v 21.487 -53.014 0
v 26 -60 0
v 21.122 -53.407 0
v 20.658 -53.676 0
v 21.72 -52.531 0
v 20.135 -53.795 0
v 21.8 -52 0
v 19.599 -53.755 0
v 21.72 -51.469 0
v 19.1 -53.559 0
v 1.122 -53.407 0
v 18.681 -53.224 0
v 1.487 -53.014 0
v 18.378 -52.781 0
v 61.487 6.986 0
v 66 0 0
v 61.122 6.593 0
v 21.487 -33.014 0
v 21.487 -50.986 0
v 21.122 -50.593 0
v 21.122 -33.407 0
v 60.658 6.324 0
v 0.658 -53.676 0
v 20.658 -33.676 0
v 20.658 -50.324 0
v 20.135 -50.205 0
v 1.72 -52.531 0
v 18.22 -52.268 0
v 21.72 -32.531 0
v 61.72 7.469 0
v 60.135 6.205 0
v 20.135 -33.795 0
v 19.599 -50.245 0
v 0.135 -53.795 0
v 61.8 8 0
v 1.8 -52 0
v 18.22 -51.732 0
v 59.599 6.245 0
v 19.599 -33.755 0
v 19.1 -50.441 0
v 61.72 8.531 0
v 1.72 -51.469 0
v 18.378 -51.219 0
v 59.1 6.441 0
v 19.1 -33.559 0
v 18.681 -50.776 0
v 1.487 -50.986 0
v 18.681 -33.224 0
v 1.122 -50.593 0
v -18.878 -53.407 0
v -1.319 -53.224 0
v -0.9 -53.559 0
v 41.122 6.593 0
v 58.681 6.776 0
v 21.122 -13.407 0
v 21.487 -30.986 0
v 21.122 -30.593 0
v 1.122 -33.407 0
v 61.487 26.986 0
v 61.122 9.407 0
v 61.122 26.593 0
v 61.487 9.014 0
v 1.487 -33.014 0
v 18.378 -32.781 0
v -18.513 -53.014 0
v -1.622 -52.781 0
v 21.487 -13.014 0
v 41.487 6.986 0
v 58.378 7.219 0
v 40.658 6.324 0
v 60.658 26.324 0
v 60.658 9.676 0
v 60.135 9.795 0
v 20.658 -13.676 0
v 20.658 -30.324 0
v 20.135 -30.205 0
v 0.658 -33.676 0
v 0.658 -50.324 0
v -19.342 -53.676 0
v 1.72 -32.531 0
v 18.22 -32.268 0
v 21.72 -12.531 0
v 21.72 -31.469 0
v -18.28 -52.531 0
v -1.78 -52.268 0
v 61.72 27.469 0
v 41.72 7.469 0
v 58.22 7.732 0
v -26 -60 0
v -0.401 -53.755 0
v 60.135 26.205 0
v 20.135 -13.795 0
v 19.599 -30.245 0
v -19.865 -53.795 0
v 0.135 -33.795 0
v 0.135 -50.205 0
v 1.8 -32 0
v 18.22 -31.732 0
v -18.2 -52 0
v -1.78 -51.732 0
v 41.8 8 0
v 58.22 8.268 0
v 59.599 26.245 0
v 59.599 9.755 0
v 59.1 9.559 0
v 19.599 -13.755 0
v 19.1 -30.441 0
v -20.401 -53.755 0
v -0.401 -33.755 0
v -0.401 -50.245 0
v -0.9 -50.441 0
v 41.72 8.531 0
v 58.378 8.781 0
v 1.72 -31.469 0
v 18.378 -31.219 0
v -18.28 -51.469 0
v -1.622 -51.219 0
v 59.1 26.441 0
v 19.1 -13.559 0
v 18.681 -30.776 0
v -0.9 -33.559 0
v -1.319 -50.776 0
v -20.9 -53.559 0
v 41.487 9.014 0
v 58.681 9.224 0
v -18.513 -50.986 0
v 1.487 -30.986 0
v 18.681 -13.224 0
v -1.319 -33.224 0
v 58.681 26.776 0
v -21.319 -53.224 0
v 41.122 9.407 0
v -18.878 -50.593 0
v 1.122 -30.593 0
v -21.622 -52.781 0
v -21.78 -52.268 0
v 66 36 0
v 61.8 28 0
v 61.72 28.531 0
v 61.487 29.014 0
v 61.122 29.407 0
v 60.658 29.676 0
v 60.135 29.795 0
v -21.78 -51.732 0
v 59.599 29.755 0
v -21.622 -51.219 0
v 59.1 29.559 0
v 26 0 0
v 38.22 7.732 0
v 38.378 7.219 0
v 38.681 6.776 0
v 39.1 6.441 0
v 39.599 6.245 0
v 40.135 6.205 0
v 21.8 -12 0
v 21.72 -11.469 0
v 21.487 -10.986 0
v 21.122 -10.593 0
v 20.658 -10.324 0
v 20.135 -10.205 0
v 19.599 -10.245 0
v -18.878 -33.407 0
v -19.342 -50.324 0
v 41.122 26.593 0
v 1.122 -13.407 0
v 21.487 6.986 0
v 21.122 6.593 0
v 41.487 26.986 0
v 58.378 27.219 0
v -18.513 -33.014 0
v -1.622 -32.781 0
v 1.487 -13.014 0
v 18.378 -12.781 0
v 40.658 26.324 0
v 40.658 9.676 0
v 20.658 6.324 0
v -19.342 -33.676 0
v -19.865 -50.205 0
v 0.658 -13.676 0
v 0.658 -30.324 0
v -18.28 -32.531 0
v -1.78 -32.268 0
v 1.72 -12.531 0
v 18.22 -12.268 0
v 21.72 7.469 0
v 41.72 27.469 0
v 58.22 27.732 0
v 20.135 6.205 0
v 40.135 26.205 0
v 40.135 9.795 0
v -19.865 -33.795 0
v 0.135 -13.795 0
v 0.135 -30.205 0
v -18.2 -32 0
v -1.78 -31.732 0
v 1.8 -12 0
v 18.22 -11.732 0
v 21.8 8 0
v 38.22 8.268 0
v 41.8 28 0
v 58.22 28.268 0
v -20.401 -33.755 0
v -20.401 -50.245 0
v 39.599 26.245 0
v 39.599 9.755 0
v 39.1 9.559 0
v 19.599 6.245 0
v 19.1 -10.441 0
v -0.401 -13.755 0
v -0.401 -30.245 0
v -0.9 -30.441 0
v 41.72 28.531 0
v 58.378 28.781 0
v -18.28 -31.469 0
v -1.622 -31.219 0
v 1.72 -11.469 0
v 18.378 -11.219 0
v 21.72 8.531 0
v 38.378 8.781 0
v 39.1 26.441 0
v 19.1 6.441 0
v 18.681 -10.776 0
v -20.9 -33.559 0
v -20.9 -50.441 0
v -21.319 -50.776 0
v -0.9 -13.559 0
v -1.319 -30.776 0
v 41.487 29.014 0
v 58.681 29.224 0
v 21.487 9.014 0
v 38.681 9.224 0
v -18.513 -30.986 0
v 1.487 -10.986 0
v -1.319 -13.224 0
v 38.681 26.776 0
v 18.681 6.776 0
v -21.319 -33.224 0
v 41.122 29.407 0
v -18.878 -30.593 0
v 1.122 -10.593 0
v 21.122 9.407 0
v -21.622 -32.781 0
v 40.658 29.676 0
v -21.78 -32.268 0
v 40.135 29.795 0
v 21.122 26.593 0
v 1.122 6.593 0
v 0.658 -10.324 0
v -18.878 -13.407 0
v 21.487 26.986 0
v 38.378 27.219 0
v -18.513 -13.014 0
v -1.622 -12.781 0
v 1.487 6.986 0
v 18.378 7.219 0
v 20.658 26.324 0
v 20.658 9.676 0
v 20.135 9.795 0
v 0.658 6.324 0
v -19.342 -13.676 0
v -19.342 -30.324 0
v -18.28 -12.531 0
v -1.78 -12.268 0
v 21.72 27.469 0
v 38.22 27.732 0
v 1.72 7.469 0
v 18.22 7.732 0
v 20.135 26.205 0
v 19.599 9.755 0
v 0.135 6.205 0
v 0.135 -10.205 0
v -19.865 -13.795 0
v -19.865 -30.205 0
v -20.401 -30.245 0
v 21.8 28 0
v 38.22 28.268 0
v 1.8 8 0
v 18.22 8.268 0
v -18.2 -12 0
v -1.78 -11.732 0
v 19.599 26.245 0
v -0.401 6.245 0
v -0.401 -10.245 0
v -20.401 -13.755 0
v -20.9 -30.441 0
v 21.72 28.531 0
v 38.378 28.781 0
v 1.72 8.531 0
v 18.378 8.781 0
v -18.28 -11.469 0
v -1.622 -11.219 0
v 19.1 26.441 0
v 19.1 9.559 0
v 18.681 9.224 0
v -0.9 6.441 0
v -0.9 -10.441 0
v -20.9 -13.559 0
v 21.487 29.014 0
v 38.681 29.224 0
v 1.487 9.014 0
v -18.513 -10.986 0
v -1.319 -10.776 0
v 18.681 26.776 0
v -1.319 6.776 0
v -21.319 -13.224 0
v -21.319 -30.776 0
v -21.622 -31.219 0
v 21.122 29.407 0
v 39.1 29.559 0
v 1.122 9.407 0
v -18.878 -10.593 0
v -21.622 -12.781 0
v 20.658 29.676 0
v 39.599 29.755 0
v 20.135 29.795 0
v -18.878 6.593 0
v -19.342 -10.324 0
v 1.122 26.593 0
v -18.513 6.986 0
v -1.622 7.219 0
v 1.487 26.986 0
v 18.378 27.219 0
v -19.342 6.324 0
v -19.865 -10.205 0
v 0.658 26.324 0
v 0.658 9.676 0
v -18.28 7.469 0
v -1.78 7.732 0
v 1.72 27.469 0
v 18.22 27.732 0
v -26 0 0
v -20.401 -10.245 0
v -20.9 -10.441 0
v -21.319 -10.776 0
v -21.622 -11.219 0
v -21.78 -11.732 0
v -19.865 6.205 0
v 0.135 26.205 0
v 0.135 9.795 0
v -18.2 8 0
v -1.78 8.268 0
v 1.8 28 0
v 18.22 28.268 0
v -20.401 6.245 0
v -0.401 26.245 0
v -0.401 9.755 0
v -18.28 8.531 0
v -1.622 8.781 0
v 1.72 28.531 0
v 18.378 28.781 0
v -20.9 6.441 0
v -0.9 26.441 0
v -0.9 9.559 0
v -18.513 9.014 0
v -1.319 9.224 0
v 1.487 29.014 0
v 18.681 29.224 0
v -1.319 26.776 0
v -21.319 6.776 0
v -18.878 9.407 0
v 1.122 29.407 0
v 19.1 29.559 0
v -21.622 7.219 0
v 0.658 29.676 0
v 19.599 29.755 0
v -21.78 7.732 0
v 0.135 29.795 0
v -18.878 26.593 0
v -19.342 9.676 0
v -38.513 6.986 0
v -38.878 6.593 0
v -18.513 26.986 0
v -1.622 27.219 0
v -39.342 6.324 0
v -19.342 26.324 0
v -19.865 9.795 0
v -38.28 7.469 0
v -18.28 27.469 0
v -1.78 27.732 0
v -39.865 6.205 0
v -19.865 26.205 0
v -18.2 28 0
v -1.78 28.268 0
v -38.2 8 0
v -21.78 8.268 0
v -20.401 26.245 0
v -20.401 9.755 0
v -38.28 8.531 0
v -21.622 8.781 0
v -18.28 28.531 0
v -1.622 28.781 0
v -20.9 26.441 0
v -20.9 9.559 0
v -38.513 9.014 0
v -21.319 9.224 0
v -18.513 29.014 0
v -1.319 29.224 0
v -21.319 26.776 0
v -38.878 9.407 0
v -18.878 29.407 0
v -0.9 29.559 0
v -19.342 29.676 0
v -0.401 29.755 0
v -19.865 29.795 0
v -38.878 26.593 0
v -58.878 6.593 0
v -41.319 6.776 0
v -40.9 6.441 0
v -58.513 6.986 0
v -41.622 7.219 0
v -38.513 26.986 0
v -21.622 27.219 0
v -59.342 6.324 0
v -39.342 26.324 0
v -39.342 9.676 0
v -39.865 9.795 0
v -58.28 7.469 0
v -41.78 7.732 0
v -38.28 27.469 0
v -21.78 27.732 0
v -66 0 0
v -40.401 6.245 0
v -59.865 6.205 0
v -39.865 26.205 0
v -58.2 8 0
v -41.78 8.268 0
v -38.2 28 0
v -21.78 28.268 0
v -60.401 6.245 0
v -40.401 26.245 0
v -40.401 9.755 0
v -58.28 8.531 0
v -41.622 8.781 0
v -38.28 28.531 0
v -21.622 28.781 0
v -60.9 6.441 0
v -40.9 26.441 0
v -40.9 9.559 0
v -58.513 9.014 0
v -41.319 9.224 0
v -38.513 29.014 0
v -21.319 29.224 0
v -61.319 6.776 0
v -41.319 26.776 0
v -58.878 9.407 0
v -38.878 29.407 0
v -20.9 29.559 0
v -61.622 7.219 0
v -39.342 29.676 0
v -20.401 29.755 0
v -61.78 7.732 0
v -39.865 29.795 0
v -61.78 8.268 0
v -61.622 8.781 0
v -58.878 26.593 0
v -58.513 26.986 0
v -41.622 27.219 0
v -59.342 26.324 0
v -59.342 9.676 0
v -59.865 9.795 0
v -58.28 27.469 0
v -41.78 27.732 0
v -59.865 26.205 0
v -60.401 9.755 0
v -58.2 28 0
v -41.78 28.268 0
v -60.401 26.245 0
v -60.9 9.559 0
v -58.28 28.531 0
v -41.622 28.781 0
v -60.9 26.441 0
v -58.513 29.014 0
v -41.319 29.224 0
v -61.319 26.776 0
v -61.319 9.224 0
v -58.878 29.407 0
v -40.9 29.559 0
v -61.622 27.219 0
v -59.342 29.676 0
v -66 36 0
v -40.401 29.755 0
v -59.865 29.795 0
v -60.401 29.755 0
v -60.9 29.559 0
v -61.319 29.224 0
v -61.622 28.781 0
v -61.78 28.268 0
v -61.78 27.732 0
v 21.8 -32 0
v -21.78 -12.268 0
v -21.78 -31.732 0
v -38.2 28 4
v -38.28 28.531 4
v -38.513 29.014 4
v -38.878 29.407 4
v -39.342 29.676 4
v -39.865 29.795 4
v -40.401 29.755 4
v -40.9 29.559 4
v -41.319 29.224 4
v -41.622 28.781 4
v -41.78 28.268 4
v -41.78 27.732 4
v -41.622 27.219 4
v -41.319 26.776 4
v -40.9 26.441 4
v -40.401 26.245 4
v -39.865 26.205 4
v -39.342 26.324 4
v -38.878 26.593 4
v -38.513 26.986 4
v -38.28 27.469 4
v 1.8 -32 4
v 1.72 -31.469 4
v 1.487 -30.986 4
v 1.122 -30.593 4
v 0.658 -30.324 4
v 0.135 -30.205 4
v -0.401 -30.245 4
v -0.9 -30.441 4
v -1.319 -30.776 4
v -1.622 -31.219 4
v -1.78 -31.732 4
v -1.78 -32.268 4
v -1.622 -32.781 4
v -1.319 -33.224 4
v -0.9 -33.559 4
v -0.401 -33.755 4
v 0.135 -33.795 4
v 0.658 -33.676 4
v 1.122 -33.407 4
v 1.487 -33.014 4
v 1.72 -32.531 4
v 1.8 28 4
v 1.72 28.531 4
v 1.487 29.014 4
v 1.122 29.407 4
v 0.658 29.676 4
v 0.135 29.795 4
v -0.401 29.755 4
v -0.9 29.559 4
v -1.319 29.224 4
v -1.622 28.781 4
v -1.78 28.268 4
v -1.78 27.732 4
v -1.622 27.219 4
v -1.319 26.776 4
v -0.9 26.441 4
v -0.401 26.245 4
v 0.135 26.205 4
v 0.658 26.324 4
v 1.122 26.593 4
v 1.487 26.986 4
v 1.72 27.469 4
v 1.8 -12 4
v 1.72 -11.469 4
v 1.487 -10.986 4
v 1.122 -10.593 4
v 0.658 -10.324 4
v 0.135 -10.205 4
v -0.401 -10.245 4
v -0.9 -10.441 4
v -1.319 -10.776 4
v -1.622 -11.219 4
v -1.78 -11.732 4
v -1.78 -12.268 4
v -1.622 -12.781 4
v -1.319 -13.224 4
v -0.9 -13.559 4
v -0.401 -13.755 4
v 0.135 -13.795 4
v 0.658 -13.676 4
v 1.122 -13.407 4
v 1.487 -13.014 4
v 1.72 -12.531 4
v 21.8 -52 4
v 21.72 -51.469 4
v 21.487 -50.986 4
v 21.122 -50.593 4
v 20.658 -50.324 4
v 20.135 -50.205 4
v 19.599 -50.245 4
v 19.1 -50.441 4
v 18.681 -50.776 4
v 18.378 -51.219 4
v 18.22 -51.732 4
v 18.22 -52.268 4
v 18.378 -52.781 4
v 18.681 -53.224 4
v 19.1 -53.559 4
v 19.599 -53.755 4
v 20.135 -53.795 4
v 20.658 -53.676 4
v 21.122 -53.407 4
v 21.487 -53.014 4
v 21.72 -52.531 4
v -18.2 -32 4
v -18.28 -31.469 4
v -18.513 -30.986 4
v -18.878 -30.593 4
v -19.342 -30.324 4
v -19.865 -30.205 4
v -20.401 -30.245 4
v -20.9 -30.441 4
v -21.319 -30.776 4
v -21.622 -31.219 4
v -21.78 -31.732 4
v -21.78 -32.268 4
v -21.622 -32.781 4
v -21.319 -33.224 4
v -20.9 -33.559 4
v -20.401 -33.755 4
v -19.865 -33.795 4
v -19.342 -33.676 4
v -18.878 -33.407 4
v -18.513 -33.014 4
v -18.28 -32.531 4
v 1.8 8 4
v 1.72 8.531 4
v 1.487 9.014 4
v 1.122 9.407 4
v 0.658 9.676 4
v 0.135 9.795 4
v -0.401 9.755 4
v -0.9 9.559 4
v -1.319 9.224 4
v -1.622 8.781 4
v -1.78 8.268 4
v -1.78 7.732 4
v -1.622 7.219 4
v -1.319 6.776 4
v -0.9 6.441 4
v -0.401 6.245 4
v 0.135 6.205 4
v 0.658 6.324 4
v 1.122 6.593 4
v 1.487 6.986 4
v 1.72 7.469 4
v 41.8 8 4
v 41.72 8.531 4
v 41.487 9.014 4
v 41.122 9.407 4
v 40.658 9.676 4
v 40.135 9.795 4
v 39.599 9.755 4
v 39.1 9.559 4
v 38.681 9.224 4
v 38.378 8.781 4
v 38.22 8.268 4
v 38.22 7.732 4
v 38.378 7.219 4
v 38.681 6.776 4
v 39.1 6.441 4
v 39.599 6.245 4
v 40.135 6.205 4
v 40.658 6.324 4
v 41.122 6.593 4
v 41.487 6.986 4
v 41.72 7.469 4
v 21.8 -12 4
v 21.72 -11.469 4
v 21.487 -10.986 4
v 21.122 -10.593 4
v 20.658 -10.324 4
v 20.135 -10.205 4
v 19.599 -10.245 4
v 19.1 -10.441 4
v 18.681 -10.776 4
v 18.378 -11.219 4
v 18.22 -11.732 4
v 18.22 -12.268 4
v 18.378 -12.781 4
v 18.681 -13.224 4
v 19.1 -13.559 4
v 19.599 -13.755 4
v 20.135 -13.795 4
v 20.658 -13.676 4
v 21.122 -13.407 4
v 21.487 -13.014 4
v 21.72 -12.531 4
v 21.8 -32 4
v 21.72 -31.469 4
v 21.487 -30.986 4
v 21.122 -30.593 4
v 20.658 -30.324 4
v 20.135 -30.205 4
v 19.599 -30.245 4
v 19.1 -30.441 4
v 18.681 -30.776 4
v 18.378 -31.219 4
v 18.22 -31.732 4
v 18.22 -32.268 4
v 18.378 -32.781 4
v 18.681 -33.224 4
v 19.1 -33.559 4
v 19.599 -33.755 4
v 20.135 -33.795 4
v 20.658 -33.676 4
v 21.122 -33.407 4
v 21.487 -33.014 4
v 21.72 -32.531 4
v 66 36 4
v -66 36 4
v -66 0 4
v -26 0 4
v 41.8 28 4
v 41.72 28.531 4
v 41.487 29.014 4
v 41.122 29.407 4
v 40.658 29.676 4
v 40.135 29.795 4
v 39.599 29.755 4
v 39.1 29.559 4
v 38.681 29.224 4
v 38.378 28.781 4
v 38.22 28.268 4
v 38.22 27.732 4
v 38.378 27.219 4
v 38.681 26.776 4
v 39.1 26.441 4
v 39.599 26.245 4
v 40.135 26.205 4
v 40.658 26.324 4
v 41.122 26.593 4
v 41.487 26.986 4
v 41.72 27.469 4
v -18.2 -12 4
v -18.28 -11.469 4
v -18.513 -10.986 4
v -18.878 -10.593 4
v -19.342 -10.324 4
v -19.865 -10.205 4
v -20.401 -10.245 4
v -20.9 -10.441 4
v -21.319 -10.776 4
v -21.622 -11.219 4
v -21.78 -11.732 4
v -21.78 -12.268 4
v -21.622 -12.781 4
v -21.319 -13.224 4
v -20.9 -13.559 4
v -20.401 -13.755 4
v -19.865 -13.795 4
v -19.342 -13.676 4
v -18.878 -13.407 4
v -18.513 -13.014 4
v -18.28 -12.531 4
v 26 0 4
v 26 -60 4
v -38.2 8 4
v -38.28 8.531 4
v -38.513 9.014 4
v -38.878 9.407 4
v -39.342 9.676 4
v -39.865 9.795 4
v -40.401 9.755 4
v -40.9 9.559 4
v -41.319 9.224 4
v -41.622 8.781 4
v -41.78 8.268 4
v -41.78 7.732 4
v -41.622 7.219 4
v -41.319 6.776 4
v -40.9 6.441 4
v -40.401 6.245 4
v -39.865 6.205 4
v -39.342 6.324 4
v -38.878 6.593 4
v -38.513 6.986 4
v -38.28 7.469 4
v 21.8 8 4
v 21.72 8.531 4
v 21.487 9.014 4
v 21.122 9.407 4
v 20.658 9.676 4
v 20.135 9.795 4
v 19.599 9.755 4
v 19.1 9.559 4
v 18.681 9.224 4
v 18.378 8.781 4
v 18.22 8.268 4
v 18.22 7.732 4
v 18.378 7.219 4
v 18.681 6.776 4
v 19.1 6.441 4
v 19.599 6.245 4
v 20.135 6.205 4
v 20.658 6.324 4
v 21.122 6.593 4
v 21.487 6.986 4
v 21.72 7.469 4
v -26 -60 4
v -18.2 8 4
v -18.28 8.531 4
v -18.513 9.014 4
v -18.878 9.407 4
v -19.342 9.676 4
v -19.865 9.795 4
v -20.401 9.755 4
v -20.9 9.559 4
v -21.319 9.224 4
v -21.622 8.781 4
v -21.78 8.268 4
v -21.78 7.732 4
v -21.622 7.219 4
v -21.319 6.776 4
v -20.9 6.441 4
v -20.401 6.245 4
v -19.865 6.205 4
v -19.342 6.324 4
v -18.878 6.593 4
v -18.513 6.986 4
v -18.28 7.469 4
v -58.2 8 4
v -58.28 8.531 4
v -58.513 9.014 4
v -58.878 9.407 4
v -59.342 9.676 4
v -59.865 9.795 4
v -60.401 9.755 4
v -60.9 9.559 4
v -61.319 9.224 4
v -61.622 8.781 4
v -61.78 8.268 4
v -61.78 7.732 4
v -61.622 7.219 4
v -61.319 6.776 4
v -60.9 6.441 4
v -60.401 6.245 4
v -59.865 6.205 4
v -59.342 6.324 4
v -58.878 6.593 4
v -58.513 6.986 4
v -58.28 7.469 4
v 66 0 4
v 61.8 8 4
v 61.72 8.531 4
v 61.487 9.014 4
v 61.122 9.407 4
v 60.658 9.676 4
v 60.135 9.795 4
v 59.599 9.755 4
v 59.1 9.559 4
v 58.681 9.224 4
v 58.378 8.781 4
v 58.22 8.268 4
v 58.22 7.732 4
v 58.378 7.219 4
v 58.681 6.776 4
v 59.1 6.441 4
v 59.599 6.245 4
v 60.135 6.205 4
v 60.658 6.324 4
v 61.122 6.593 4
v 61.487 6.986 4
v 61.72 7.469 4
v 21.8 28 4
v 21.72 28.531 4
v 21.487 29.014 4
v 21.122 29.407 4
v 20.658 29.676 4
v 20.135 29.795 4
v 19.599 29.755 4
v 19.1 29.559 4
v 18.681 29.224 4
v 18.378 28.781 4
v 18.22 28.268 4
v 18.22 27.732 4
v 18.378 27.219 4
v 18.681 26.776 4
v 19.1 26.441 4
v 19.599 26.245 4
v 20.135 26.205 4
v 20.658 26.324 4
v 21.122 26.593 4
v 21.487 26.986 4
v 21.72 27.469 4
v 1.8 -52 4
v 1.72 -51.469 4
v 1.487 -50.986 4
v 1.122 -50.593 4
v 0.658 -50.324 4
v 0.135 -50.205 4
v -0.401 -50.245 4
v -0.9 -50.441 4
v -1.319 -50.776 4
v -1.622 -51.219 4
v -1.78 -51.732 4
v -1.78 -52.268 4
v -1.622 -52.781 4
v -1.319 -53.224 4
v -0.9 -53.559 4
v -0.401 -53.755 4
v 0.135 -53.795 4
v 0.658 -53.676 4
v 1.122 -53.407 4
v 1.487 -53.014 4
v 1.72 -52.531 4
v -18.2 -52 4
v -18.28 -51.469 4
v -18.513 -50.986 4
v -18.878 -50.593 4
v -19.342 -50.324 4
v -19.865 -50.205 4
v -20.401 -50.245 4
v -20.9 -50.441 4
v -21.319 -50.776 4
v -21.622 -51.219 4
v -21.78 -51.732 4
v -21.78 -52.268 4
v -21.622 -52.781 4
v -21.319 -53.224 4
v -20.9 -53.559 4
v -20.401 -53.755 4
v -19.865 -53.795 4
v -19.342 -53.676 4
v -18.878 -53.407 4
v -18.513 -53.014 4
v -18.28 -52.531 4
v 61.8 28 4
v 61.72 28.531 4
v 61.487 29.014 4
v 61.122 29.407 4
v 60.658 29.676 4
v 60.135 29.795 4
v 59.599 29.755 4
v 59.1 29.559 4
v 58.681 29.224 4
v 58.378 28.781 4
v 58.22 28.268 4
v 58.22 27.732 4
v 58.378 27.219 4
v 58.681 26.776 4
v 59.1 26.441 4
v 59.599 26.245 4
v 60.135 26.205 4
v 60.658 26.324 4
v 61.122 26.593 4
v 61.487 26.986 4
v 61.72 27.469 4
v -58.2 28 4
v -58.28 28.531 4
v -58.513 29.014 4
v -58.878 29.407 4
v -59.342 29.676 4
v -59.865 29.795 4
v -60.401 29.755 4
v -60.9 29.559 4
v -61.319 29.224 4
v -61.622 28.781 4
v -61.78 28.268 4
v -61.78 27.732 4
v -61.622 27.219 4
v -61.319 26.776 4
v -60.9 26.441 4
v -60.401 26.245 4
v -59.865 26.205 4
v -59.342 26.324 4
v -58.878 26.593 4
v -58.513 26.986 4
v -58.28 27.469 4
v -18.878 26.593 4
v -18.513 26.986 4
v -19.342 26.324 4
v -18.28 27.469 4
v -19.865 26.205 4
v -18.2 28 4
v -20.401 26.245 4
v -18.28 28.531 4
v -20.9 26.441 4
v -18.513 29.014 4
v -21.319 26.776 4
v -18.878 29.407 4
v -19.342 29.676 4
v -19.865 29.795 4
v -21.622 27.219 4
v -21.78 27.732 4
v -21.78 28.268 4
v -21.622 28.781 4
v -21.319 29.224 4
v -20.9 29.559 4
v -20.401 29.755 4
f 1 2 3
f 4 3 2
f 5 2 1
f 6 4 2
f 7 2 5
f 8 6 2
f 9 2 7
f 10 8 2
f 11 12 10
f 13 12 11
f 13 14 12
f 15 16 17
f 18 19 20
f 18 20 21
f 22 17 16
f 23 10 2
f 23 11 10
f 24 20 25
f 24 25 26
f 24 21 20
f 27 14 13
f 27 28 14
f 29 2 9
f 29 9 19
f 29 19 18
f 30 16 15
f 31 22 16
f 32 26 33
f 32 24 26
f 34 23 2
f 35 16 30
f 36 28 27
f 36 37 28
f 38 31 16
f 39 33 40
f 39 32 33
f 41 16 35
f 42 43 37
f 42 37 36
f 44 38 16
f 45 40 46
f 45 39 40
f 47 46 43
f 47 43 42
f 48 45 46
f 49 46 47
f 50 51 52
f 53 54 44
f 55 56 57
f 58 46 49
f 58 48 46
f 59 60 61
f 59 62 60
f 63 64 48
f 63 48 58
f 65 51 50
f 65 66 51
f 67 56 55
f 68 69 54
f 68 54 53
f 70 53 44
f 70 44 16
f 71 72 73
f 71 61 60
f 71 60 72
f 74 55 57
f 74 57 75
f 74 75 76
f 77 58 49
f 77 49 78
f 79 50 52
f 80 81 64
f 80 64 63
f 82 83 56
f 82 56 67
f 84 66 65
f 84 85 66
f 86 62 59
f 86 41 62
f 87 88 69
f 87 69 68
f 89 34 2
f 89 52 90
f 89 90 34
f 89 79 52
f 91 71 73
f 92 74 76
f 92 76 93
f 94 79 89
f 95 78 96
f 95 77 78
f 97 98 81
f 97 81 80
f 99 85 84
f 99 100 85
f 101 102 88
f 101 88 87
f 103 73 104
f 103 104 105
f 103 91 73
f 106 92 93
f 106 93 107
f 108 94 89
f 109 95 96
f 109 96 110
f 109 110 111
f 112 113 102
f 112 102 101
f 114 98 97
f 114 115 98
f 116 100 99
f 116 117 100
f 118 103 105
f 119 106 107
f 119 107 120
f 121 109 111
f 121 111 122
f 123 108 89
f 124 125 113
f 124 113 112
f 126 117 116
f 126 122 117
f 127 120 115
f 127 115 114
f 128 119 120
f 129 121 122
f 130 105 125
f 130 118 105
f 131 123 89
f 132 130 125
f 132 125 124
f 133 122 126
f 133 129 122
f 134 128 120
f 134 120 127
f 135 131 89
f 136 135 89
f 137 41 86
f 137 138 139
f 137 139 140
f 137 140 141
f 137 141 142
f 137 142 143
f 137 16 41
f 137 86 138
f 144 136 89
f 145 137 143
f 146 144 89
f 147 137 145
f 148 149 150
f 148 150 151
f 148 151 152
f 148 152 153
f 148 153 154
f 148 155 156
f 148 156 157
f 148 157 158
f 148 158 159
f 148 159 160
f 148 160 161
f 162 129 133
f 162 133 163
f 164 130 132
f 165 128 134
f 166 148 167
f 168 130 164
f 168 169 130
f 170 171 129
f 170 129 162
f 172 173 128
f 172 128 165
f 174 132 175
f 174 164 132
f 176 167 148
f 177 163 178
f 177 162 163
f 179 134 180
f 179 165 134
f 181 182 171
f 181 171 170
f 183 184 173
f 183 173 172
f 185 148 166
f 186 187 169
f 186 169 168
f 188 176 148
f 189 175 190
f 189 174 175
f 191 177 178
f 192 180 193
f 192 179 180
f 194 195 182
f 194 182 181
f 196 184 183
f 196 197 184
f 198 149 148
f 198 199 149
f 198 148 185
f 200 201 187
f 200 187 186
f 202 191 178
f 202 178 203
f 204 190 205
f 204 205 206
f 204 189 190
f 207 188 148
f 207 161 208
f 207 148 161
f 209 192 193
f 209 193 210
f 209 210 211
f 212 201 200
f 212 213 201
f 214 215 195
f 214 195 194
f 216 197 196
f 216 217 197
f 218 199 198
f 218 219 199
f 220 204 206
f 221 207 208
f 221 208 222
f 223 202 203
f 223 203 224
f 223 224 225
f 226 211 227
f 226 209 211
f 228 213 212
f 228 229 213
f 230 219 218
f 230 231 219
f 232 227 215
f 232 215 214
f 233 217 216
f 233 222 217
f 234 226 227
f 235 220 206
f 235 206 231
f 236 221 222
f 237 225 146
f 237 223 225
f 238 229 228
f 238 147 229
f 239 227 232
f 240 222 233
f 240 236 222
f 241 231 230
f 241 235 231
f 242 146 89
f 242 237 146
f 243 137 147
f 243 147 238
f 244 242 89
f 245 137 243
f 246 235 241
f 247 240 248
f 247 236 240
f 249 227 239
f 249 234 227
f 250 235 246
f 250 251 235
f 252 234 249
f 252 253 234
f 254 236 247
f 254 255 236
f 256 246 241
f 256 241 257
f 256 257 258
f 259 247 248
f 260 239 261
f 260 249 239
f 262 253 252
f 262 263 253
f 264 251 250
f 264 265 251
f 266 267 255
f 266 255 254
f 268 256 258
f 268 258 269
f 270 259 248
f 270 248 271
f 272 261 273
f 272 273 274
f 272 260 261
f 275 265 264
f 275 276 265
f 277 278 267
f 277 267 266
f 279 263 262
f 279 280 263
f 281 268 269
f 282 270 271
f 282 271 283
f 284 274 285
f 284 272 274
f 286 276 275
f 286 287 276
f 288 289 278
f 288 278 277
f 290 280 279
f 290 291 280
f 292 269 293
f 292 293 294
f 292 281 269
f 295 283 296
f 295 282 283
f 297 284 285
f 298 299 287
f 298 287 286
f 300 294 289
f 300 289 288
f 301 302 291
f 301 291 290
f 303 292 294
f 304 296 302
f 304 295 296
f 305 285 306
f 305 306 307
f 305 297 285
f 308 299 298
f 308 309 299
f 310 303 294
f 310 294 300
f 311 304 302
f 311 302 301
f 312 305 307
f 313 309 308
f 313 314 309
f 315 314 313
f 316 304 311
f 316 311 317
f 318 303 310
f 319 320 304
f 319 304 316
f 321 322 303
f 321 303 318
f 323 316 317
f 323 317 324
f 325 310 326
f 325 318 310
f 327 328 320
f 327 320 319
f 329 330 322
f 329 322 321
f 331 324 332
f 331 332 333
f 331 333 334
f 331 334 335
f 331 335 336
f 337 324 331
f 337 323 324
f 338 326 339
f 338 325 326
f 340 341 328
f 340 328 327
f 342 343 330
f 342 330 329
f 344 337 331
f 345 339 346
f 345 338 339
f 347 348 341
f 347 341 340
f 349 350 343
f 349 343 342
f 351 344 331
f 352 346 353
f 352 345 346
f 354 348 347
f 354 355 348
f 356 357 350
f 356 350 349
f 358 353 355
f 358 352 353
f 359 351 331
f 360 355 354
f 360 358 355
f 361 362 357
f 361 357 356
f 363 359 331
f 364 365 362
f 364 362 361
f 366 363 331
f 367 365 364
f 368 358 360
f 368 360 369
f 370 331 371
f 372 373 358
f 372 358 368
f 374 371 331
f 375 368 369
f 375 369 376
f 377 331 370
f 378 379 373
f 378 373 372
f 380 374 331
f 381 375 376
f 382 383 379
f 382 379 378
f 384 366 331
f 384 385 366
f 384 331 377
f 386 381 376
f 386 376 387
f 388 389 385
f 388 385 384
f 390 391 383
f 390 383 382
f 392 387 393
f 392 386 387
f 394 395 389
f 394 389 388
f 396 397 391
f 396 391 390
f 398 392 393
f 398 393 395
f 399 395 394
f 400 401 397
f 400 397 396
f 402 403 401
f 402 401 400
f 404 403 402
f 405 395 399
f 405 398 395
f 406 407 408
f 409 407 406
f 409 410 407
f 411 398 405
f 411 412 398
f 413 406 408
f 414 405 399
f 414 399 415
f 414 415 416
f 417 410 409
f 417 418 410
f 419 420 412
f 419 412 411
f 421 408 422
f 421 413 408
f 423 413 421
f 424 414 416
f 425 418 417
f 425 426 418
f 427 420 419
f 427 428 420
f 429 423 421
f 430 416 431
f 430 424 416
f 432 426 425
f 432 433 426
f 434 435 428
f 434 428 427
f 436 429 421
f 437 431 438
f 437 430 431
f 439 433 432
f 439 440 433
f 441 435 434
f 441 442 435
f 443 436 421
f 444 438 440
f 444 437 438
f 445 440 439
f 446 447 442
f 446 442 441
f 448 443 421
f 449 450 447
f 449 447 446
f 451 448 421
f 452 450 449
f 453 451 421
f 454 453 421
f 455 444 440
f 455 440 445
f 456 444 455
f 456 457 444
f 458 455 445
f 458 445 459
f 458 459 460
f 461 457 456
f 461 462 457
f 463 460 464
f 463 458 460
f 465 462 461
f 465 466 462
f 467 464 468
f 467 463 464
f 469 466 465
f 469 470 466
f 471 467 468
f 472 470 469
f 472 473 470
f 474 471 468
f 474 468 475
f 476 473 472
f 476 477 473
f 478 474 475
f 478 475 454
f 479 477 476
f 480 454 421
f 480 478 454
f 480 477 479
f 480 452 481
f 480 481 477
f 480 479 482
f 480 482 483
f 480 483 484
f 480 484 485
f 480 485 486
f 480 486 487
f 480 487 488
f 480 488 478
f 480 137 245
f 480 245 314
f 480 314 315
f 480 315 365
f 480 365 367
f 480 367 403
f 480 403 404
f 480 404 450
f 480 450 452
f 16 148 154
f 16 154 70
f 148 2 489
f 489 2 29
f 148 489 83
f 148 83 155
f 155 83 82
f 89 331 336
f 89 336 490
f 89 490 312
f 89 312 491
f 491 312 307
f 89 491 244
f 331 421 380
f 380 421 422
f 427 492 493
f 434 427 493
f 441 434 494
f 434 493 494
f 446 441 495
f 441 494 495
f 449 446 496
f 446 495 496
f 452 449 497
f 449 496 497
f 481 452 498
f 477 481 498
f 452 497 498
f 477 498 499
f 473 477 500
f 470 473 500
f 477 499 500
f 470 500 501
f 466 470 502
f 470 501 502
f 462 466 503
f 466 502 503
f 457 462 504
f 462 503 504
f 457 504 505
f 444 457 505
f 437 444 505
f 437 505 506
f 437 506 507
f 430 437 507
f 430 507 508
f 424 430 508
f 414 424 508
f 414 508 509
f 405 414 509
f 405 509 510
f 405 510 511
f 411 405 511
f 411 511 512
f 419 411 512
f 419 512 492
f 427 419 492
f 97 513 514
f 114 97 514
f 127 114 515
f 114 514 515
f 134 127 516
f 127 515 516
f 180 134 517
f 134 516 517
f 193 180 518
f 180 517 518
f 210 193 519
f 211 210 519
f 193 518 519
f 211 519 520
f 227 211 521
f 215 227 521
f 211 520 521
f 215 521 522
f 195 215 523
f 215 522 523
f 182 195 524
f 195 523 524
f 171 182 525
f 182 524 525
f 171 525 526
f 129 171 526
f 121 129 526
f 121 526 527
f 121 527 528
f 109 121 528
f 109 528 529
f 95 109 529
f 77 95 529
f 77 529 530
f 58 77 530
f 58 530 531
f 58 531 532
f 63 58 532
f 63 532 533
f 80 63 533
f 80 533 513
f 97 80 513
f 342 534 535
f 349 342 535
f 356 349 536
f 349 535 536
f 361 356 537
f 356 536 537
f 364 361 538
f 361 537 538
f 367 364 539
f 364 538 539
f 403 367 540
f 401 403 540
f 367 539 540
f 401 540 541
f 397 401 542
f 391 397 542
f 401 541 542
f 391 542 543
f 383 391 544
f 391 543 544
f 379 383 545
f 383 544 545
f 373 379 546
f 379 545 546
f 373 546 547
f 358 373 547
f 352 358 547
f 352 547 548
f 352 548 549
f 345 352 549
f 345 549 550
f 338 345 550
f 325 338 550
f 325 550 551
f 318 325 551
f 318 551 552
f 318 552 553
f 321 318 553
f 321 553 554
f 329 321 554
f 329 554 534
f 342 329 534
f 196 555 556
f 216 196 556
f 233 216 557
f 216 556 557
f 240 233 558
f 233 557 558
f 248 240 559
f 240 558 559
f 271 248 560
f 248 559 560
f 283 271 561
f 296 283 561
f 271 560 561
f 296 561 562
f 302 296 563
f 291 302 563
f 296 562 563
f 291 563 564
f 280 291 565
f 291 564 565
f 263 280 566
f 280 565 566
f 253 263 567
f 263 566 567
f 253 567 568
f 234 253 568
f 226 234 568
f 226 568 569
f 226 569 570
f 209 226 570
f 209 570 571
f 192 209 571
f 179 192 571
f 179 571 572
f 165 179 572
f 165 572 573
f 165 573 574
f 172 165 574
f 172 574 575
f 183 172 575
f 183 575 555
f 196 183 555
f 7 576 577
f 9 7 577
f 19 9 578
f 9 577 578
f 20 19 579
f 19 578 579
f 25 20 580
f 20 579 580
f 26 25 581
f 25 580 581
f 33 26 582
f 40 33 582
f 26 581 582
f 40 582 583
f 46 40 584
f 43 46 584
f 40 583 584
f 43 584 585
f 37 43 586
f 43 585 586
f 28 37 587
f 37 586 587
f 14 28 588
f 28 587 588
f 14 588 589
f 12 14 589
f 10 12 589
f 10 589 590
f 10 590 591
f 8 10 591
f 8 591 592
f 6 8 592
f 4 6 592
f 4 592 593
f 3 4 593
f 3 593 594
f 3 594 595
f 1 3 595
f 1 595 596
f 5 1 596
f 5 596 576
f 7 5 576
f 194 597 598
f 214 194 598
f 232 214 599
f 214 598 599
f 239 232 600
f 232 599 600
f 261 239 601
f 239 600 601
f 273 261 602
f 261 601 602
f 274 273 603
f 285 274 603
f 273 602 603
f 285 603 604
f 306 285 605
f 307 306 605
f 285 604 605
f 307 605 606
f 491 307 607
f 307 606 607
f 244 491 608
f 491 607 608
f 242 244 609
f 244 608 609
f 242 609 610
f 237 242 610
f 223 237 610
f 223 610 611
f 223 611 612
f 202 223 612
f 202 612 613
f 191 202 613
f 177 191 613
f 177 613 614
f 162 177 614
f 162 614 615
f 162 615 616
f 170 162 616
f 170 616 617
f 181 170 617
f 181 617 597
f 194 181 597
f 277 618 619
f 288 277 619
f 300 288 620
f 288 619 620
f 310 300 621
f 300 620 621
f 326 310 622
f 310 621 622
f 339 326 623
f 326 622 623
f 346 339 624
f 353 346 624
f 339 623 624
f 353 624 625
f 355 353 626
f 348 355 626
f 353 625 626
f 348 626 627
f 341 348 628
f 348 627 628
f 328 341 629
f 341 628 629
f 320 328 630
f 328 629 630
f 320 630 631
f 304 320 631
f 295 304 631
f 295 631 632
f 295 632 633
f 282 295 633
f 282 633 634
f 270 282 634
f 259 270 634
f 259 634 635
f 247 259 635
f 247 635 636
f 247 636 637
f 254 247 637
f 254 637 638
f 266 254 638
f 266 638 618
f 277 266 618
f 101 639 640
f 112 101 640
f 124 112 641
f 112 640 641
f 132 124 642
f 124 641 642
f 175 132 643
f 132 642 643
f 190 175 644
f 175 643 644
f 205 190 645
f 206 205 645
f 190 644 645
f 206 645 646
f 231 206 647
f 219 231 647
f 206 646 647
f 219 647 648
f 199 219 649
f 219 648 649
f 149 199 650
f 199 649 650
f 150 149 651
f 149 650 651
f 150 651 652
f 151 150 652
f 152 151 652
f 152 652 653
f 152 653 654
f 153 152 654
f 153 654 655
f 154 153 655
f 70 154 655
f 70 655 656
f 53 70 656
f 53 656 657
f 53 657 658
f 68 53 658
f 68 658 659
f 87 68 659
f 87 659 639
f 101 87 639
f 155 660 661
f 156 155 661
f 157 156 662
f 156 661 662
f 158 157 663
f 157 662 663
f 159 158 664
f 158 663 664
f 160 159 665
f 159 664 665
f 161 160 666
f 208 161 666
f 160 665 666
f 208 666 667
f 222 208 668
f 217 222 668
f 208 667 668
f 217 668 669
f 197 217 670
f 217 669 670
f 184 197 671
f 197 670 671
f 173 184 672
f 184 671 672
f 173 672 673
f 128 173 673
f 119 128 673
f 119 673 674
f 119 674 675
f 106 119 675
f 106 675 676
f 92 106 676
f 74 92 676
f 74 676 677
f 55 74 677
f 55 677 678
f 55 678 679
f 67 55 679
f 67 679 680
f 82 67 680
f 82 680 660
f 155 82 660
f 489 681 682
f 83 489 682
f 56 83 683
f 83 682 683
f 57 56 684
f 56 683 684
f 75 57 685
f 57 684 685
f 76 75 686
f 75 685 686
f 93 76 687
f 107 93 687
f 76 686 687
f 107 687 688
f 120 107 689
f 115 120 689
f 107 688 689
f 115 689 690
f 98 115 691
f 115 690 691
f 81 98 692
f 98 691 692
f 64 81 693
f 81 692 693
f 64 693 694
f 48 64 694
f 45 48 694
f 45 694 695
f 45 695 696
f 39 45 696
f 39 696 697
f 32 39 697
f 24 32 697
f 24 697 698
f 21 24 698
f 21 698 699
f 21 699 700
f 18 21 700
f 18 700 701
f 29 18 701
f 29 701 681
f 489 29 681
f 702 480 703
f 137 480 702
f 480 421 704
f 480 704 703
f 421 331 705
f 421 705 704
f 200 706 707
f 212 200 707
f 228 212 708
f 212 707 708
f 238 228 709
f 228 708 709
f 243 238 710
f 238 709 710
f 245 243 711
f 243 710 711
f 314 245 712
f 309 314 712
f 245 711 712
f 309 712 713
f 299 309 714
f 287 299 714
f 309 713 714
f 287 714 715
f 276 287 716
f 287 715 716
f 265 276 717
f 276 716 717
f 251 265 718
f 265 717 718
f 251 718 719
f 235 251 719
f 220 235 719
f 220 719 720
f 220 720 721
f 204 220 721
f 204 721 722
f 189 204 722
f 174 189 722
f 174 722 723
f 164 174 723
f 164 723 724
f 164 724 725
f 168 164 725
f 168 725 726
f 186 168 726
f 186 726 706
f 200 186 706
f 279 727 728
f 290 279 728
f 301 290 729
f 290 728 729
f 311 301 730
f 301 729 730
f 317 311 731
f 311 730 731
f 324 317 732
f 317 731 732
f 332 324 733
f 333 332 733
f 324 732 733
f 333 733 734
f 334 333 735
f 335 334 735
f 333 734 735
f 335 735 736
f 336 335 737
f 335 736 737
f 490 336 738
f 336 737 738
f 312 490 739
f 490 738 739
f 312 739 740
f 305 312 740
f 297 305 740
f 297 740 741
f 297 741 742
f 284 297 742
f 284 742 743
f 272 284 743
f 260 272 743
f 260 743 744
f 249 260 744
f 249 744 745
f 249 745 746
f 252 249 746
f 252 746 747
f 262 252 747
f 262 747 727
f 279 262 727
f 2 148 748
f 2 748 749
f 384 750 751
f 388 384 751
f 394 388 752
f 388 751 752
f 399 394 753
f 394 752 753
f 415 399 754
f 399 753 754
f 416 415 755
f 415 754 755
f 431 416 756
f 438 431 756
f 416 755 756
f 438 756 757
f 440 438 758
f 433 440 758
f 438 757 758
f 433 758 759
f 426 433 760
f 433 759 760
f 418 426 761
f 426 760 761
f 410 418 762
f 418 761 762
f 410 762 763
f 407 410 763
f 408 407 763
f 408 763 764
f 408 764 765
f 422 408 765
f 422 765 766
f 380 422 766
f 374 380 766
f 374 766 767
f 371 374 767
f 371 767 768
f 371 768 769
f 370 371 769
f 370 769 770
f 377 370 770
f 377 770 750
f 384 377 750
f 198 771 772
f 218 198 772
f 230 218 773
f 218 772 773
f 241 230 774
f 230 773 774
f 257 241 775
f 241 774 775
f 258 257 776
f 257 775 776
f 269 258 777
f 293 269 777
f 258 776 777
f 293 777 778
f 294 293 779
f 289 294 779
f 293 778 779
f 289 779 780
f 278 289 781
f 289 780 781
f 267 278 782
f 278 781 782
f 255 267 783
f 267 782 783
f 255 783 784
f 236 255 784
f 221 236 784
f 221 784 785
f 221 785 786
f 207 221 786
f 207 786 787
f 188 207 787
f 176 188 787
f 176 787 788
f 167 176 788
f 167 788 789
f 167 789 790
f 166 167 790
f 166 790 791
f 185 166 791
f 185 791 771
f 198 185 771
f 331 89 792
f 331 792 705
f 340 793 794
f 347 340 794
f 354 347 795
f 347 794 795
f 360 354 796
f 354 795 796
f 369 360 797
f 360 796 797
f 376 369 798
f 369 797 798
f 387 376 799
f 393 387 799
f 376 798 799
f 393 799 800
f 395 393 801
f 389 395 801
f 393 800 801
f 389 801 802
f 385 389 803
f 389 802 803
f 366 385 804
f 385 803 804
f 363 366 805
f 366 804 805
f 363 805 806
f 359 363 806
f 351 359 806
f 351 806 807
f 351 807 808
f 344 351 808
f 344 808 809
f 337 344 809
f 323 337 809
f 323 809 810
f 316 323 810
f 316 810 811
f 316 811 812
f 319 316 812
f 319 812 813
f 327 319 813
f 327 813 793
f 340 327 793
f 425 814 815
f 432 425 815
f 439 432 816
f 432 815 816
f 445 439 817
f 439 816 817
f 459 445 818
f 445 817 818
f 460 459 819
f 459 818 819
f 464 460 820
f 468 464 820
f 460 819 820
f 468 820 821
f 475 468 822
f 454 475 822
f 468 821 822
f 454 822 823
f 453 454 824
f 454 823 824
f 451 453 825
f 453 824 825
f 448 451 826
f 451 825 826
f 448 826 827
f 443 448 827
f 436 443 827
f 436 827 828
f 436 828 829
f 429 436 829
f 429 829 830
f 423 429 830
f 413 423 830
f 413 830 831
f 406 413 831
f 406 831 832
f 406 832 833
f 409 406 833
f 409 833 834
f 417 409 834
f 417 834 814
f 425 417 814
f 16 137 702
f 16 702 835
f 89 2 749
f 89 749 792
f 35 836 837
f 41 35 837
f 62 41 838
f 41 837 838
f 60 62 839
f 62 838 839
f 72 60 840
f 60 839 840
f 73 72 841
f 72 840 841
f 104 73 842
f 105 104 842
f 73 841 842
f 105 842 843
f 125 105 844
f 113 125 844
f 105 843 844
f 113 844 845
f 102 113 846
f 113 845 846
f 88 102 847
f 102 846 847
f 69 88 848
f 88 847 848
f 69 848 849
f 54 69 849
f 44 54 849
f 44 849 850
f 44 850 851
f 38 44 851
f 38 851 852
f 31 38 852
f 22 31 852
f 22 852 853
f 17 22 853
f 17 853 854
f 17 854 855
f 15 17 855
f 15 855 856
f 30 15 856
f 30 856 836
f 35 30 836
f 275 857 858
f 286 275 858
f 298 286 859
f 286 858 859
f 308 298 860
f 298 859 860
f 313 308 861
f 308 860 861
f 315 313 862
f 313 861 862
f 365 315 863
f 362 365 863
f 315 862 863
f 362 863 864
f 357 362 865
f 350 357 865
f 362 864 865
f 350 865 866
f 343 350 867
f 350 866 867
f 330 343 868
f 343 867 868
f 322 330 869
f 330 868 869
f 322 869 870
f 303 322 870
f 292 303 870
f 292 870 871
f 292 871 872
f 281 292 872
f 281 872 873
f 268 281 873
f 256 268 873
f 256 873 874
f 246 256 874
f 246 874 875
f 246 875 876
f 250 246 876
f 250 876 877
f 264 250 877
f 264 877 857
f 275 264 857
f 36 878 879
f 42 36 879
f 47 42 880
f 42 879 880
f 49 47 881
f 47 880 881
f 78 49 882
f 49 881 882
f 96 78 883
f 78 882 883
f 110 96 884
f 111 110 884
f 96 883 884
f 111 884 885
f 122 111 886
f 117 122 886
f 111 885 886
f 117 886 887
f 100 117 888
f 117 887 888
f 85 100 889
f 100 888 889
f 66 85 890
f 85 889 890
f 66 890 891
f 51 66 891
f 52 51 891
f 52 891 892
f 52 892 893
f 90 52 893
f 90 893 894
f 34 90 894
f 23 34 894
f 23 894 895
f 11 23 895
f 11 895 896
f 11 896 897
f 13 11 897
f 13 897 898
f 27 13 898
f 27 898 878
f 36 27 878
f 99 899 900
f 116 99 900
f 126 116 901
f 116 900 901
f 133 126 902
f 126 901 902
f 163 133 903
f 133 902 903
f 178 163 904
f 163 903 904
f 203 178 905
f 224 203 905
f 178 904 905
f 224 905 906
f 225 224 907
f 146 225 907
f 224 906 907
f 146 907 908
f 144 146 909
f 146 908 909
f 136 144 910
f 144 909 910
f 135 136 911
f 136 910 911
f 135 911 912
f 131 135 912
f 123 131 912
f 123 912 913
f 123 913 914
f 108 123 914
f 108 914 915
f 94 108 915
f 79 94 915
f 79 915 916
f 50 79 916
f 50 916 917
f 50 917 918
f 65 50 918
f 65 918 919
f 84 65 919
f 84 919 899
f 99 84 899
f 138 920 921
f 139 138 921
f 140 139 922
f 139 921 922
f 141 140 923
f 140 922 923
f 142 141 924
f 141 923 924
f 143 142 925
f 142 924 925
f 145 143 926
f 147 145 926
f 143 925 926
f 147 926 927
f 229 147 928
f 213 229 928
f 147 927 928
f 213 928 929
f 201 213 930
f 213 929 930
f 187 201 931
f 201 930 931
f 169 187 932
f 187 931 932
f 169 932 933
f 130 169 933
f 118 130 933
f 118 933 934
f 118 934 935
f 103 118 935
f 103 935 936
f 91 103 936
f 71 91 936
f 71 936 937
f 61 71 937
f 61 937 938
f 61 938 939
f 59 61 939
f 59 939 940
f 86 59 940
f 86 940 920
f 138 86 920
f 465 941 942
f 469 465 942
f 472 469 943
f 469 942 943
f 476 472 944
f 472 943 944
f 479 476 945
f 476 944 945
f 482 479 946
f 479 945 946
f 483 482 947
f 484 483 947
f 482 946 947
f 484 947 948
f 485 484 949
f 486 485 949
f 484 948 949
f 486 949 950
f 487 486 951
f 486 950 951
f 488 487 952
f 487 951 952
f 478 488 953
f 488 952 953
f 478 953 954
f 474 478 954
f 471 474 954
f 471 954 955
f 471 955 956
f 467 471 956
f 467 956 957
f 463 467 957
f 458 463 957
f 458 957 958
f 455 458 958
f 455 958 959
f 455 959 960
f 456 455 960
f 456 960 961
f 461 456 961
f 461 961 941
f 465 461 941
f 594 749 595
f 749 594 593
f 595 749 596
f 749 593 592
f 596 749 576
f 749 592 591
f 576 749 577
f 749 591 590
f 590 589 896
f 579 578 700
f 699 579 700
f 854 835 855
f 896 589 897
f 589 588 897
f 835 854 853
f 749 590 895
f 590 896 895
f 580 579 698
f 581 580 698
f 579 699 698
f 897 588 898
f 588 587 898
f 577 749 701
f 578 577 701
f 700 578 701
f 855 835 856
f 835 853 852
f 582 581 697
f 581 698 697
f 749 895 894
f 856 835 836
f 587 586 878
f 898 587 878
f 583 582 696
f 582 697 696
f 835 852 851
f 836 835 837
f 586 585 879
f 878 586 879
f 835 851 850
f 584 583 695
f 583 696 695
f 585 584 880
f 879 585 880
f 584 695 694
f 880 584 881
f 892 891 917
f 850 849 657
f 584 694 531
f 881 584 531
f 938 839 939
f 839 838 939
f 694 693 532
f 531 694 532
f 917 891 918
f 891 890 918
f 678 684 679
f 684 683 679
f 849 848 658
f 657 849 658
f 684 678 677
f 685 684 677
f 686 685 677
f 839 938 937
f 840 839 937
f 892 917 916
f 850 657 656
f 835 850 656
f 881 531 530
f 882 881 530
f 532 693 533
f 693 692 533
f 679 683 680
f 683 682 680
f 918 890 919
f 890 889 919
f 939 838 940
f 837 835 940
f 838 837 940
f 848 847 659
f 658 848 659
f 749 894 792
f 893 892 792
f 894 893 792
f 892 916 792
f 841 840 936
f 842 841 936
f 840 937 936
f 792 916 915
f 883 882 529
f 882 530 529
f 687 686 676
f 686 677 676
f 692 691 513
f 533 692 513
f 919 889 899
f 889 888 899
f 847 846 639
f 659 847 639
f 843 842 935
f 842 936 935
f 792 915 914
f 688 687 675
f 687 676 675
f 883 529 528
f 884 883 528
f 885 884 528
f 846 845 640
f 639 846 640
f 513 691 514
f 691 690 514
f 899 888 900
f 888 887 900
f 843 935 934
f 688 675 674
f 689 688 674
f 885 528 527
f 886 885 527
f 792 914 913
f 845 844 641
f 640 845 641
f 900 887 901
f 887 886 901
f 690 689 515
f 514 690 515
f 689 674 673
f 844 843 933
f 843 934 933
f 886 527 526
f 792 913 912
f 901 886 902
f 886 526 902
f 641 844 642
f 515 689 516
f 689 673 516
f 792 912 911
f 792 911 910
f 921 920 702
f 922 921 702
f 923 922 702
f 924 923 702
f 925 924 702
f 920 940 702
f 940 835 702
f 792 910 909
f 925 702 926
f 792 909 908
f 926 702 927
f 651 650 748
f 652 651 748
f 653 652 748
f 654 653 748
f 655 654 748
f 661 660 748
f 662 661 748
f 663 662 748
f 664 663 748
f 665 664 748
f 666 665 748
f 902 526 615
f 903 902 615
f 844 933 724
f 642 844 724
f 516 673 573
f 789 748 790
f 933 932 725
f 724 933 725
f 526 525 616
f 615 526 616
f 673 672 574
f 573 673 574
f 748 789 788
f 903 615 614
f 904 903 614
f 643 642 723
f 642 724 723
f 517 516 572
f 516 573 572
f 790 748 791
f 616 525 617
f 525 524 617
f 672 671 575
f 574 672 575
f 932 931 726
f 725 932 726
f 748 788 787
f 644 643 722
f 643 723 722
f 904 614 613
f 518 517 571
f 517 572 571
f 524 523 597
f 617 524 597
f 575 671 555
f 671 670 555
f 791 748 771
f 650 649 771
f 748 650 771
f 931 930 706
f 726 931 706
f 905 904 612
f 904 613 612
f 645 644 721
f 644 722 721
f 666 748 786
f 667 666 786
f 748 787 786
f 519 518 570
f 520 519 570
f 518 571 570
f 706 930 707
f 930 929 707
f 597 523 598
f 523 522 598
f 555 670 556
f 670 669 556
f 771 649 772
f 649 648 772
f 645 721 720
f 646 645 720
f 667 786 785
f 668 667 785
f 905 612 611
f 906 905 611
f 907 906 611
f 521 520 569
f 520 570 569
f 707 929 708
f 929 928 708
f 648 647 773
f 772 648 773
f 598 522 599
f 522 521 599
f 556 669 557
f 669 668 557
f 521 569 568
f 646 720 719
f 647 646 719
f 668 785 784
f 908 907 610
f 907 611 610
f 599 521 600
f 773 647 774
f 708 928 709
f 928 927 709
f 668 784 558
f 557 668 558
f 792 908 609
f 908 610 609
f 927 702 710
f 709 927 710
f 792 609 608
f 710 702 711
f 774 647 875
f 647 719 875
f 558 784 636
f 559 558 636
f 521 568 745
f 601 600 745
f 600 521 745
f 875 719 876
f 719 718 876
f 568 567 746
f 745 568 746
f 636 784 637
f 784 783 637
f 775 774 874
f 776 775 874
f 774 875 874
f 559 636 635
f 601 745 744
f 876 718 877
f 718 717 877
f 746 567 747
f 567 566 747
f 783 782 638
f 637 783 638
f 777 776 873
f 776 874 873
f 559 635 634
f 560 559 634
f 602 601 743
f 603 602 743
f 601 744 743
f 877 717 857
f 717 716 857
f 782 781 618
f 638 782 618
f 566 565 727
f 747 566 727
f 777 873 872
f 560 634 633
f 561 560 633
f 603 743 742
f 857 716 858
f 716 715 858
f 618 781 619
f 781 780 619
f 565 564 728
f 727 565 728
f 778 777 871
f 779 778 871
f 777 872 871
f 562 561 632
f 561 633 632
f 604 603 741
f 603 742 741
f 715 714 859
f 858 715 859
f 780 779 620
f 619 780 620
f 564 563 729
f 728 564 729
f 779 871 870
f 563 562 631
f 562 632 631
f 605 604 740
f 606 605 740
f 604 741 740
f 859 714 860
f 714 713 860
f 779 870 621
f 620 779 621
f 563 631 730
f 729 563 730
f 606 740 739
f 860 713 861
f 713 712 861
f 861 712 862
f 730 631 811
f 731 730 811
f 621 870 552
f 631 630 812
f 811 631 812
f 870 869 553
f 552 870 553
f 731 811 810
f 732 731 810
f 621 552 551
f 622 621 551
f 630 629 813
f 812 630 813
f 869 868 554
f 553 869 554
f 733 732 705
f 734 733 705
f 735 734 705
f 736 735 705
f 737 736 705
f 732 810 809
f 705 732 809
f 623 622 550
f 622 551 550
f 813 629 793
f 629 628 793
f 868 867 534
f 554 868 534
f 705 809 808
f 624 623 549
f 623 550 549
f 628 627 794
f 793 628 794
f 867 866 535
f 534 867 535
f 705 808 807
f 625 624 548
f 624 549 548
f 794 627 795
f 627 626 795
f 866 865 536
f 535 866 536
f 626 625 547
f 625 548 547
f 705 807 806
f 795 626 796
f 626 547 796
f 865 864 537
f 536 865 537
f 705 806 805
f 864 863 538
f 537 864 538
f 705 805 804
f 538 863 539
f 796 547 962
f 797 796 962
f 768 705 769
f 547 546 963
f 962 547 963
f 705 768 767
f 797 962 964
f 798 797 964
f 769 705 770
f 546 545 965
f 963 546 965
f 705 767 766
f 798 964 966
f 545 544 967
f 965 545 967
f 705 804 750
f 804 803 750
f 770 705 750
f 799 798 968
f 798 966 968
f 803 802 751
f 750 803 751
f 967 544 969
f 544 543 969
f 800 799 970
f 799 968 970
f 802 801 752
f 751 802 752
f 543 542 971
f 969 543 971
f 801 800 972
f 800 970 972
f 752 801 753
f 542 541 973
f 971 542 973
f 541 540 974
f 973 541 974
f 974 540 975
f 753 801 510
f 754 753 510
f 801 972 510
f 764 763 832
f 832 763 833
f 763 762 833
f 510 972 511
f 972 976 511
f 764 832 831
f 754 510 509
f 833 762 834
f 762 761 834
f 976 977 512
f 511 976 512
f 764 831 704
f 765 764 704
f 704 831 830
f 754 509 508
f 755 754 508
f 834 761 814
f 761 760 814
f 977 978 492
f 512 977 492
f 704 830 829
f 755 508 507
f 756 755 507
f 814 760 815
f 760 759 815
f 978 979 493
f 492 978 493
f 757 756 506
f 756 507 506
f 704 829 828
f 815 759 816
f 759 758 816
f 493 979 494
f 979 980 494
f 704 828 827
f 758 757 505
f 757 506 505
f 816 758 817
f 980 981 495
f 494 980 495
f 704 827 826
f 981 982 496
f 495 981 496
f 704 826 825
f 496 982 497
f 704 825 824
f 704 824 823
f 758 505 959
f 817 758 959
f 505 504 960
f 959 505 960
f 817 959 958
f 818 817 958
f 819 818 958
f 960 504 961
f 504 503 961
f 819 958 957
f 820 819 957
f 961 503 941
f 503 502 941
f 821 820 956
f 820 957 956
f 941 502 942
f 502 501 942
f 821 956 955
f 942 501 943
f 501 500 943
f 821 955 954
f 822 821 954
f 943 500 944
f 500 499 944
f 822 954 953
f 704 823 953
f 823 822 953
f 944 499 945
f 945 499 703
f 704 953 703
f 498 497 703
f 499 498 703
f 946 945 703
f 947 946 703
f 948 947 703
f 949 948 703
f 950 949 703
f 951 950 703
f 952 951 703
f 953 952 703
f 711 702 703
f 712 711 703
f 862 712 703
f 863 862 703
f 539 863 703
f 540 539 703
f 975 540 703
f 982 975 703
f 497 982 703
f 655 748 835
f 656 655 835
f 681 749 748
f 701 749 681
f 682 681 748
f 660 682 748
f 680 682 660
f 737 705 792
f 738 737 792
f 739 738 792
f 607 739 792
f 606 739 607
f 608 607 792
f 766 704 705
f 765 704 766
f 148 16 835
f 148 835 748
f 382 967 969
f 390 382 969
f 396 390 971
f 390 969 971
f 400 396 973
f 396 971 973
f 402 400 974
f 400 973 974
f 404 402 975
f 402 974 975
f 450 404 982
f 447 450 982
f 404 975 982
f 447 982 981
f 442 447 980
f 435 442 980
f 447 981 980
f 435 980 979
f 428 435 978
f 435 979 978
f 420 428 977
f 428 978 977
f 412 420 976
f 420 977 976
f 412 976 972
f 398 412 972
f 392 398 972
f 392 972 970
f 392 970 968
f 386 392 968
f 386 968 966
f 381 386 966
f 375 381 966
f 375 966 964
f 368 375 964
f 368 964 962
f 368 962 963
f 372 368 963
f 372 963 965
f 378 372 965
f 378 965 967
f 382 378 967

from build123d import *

# Parameters (mm, degrees)
PAD_DEPTH    = 4
SKETCH001_R  = 1.8
POCKET_DEPTH = 5


with BuildPart() as part:
    # Sketch → Pad (new body)
    with BuildSketch(Plane.XY):
        Polygon((-66, 0), (-66, 36), (66, 36), (66, 0), (26, 0), (26, -60), (-26, -60), (-26, 0), align=None)
    extrude(amount=PAD_DEPTH)

    # Sketch001 (on Face10 of Pad) → Pocket (cut)
    with BuildSketch(Plane.XY.offset(4)):
        with Locations((-60, 28)):
            Circle(SKETCH001_R)
        with Locations((-40, 28)):
            Circle(SKETCH001_R)
        with Locations((-60, 8)):
            Circle(SKETCH001_R)
        with Locations((-40, 8)):
            Circle(SKETCH001_R)
        with Locations((40, 28)):
            Circle(SKETCH001_R)
        with Locations((40, 8)):
            Circle(SKETCH001_R)
        with Locations((60, 28)):
            Circle(SKETCH001_R)
        with Locations((60, 8)):
            Circle(SKETCH001_R)
        with Locations((-20, -52)):
            Circle(SKETCH001_R)
        with Locations((0, -52)):
            Circle(SKETCH001_R)
        with Locations((20, -52)):
            Circle(SKETCH001_R)
        with Locations((-20, -32)):
            Circle(SKETCH001_R)
        with Locations((0, -32)):
            Circle(SKETCH001_R)
        with Locations((20, -32)):
            Circle(SKETCH001_R)
        with Locations((-20, -12)):
            Circle(SKETCH001_R)
        with Locations((0, -12)):
            Circle(SKETCH001_R)
        with Locations((20, -12)):
            Circle(SKETCH001_R)
        with Locations((20, 8)):
            Circle(SKETCH001_R)
        with Locations((0, 8)):
            Circle(SKETCH001_R)
        with Locations((-20, 8)):
            Circle(SKETCH001_R)
        with Locations((-20, 28)):
            Circle(SKETCH001_R)
        with Locations((0, 28)):
            Circle(SKETCH001_R)
        with Locations((20, 28)):
            Circle(SKETCH001_R)
    extrude(amount=-POCKET_DEPTH, mode=Mode.SUBTRACT)


solid = part.part
